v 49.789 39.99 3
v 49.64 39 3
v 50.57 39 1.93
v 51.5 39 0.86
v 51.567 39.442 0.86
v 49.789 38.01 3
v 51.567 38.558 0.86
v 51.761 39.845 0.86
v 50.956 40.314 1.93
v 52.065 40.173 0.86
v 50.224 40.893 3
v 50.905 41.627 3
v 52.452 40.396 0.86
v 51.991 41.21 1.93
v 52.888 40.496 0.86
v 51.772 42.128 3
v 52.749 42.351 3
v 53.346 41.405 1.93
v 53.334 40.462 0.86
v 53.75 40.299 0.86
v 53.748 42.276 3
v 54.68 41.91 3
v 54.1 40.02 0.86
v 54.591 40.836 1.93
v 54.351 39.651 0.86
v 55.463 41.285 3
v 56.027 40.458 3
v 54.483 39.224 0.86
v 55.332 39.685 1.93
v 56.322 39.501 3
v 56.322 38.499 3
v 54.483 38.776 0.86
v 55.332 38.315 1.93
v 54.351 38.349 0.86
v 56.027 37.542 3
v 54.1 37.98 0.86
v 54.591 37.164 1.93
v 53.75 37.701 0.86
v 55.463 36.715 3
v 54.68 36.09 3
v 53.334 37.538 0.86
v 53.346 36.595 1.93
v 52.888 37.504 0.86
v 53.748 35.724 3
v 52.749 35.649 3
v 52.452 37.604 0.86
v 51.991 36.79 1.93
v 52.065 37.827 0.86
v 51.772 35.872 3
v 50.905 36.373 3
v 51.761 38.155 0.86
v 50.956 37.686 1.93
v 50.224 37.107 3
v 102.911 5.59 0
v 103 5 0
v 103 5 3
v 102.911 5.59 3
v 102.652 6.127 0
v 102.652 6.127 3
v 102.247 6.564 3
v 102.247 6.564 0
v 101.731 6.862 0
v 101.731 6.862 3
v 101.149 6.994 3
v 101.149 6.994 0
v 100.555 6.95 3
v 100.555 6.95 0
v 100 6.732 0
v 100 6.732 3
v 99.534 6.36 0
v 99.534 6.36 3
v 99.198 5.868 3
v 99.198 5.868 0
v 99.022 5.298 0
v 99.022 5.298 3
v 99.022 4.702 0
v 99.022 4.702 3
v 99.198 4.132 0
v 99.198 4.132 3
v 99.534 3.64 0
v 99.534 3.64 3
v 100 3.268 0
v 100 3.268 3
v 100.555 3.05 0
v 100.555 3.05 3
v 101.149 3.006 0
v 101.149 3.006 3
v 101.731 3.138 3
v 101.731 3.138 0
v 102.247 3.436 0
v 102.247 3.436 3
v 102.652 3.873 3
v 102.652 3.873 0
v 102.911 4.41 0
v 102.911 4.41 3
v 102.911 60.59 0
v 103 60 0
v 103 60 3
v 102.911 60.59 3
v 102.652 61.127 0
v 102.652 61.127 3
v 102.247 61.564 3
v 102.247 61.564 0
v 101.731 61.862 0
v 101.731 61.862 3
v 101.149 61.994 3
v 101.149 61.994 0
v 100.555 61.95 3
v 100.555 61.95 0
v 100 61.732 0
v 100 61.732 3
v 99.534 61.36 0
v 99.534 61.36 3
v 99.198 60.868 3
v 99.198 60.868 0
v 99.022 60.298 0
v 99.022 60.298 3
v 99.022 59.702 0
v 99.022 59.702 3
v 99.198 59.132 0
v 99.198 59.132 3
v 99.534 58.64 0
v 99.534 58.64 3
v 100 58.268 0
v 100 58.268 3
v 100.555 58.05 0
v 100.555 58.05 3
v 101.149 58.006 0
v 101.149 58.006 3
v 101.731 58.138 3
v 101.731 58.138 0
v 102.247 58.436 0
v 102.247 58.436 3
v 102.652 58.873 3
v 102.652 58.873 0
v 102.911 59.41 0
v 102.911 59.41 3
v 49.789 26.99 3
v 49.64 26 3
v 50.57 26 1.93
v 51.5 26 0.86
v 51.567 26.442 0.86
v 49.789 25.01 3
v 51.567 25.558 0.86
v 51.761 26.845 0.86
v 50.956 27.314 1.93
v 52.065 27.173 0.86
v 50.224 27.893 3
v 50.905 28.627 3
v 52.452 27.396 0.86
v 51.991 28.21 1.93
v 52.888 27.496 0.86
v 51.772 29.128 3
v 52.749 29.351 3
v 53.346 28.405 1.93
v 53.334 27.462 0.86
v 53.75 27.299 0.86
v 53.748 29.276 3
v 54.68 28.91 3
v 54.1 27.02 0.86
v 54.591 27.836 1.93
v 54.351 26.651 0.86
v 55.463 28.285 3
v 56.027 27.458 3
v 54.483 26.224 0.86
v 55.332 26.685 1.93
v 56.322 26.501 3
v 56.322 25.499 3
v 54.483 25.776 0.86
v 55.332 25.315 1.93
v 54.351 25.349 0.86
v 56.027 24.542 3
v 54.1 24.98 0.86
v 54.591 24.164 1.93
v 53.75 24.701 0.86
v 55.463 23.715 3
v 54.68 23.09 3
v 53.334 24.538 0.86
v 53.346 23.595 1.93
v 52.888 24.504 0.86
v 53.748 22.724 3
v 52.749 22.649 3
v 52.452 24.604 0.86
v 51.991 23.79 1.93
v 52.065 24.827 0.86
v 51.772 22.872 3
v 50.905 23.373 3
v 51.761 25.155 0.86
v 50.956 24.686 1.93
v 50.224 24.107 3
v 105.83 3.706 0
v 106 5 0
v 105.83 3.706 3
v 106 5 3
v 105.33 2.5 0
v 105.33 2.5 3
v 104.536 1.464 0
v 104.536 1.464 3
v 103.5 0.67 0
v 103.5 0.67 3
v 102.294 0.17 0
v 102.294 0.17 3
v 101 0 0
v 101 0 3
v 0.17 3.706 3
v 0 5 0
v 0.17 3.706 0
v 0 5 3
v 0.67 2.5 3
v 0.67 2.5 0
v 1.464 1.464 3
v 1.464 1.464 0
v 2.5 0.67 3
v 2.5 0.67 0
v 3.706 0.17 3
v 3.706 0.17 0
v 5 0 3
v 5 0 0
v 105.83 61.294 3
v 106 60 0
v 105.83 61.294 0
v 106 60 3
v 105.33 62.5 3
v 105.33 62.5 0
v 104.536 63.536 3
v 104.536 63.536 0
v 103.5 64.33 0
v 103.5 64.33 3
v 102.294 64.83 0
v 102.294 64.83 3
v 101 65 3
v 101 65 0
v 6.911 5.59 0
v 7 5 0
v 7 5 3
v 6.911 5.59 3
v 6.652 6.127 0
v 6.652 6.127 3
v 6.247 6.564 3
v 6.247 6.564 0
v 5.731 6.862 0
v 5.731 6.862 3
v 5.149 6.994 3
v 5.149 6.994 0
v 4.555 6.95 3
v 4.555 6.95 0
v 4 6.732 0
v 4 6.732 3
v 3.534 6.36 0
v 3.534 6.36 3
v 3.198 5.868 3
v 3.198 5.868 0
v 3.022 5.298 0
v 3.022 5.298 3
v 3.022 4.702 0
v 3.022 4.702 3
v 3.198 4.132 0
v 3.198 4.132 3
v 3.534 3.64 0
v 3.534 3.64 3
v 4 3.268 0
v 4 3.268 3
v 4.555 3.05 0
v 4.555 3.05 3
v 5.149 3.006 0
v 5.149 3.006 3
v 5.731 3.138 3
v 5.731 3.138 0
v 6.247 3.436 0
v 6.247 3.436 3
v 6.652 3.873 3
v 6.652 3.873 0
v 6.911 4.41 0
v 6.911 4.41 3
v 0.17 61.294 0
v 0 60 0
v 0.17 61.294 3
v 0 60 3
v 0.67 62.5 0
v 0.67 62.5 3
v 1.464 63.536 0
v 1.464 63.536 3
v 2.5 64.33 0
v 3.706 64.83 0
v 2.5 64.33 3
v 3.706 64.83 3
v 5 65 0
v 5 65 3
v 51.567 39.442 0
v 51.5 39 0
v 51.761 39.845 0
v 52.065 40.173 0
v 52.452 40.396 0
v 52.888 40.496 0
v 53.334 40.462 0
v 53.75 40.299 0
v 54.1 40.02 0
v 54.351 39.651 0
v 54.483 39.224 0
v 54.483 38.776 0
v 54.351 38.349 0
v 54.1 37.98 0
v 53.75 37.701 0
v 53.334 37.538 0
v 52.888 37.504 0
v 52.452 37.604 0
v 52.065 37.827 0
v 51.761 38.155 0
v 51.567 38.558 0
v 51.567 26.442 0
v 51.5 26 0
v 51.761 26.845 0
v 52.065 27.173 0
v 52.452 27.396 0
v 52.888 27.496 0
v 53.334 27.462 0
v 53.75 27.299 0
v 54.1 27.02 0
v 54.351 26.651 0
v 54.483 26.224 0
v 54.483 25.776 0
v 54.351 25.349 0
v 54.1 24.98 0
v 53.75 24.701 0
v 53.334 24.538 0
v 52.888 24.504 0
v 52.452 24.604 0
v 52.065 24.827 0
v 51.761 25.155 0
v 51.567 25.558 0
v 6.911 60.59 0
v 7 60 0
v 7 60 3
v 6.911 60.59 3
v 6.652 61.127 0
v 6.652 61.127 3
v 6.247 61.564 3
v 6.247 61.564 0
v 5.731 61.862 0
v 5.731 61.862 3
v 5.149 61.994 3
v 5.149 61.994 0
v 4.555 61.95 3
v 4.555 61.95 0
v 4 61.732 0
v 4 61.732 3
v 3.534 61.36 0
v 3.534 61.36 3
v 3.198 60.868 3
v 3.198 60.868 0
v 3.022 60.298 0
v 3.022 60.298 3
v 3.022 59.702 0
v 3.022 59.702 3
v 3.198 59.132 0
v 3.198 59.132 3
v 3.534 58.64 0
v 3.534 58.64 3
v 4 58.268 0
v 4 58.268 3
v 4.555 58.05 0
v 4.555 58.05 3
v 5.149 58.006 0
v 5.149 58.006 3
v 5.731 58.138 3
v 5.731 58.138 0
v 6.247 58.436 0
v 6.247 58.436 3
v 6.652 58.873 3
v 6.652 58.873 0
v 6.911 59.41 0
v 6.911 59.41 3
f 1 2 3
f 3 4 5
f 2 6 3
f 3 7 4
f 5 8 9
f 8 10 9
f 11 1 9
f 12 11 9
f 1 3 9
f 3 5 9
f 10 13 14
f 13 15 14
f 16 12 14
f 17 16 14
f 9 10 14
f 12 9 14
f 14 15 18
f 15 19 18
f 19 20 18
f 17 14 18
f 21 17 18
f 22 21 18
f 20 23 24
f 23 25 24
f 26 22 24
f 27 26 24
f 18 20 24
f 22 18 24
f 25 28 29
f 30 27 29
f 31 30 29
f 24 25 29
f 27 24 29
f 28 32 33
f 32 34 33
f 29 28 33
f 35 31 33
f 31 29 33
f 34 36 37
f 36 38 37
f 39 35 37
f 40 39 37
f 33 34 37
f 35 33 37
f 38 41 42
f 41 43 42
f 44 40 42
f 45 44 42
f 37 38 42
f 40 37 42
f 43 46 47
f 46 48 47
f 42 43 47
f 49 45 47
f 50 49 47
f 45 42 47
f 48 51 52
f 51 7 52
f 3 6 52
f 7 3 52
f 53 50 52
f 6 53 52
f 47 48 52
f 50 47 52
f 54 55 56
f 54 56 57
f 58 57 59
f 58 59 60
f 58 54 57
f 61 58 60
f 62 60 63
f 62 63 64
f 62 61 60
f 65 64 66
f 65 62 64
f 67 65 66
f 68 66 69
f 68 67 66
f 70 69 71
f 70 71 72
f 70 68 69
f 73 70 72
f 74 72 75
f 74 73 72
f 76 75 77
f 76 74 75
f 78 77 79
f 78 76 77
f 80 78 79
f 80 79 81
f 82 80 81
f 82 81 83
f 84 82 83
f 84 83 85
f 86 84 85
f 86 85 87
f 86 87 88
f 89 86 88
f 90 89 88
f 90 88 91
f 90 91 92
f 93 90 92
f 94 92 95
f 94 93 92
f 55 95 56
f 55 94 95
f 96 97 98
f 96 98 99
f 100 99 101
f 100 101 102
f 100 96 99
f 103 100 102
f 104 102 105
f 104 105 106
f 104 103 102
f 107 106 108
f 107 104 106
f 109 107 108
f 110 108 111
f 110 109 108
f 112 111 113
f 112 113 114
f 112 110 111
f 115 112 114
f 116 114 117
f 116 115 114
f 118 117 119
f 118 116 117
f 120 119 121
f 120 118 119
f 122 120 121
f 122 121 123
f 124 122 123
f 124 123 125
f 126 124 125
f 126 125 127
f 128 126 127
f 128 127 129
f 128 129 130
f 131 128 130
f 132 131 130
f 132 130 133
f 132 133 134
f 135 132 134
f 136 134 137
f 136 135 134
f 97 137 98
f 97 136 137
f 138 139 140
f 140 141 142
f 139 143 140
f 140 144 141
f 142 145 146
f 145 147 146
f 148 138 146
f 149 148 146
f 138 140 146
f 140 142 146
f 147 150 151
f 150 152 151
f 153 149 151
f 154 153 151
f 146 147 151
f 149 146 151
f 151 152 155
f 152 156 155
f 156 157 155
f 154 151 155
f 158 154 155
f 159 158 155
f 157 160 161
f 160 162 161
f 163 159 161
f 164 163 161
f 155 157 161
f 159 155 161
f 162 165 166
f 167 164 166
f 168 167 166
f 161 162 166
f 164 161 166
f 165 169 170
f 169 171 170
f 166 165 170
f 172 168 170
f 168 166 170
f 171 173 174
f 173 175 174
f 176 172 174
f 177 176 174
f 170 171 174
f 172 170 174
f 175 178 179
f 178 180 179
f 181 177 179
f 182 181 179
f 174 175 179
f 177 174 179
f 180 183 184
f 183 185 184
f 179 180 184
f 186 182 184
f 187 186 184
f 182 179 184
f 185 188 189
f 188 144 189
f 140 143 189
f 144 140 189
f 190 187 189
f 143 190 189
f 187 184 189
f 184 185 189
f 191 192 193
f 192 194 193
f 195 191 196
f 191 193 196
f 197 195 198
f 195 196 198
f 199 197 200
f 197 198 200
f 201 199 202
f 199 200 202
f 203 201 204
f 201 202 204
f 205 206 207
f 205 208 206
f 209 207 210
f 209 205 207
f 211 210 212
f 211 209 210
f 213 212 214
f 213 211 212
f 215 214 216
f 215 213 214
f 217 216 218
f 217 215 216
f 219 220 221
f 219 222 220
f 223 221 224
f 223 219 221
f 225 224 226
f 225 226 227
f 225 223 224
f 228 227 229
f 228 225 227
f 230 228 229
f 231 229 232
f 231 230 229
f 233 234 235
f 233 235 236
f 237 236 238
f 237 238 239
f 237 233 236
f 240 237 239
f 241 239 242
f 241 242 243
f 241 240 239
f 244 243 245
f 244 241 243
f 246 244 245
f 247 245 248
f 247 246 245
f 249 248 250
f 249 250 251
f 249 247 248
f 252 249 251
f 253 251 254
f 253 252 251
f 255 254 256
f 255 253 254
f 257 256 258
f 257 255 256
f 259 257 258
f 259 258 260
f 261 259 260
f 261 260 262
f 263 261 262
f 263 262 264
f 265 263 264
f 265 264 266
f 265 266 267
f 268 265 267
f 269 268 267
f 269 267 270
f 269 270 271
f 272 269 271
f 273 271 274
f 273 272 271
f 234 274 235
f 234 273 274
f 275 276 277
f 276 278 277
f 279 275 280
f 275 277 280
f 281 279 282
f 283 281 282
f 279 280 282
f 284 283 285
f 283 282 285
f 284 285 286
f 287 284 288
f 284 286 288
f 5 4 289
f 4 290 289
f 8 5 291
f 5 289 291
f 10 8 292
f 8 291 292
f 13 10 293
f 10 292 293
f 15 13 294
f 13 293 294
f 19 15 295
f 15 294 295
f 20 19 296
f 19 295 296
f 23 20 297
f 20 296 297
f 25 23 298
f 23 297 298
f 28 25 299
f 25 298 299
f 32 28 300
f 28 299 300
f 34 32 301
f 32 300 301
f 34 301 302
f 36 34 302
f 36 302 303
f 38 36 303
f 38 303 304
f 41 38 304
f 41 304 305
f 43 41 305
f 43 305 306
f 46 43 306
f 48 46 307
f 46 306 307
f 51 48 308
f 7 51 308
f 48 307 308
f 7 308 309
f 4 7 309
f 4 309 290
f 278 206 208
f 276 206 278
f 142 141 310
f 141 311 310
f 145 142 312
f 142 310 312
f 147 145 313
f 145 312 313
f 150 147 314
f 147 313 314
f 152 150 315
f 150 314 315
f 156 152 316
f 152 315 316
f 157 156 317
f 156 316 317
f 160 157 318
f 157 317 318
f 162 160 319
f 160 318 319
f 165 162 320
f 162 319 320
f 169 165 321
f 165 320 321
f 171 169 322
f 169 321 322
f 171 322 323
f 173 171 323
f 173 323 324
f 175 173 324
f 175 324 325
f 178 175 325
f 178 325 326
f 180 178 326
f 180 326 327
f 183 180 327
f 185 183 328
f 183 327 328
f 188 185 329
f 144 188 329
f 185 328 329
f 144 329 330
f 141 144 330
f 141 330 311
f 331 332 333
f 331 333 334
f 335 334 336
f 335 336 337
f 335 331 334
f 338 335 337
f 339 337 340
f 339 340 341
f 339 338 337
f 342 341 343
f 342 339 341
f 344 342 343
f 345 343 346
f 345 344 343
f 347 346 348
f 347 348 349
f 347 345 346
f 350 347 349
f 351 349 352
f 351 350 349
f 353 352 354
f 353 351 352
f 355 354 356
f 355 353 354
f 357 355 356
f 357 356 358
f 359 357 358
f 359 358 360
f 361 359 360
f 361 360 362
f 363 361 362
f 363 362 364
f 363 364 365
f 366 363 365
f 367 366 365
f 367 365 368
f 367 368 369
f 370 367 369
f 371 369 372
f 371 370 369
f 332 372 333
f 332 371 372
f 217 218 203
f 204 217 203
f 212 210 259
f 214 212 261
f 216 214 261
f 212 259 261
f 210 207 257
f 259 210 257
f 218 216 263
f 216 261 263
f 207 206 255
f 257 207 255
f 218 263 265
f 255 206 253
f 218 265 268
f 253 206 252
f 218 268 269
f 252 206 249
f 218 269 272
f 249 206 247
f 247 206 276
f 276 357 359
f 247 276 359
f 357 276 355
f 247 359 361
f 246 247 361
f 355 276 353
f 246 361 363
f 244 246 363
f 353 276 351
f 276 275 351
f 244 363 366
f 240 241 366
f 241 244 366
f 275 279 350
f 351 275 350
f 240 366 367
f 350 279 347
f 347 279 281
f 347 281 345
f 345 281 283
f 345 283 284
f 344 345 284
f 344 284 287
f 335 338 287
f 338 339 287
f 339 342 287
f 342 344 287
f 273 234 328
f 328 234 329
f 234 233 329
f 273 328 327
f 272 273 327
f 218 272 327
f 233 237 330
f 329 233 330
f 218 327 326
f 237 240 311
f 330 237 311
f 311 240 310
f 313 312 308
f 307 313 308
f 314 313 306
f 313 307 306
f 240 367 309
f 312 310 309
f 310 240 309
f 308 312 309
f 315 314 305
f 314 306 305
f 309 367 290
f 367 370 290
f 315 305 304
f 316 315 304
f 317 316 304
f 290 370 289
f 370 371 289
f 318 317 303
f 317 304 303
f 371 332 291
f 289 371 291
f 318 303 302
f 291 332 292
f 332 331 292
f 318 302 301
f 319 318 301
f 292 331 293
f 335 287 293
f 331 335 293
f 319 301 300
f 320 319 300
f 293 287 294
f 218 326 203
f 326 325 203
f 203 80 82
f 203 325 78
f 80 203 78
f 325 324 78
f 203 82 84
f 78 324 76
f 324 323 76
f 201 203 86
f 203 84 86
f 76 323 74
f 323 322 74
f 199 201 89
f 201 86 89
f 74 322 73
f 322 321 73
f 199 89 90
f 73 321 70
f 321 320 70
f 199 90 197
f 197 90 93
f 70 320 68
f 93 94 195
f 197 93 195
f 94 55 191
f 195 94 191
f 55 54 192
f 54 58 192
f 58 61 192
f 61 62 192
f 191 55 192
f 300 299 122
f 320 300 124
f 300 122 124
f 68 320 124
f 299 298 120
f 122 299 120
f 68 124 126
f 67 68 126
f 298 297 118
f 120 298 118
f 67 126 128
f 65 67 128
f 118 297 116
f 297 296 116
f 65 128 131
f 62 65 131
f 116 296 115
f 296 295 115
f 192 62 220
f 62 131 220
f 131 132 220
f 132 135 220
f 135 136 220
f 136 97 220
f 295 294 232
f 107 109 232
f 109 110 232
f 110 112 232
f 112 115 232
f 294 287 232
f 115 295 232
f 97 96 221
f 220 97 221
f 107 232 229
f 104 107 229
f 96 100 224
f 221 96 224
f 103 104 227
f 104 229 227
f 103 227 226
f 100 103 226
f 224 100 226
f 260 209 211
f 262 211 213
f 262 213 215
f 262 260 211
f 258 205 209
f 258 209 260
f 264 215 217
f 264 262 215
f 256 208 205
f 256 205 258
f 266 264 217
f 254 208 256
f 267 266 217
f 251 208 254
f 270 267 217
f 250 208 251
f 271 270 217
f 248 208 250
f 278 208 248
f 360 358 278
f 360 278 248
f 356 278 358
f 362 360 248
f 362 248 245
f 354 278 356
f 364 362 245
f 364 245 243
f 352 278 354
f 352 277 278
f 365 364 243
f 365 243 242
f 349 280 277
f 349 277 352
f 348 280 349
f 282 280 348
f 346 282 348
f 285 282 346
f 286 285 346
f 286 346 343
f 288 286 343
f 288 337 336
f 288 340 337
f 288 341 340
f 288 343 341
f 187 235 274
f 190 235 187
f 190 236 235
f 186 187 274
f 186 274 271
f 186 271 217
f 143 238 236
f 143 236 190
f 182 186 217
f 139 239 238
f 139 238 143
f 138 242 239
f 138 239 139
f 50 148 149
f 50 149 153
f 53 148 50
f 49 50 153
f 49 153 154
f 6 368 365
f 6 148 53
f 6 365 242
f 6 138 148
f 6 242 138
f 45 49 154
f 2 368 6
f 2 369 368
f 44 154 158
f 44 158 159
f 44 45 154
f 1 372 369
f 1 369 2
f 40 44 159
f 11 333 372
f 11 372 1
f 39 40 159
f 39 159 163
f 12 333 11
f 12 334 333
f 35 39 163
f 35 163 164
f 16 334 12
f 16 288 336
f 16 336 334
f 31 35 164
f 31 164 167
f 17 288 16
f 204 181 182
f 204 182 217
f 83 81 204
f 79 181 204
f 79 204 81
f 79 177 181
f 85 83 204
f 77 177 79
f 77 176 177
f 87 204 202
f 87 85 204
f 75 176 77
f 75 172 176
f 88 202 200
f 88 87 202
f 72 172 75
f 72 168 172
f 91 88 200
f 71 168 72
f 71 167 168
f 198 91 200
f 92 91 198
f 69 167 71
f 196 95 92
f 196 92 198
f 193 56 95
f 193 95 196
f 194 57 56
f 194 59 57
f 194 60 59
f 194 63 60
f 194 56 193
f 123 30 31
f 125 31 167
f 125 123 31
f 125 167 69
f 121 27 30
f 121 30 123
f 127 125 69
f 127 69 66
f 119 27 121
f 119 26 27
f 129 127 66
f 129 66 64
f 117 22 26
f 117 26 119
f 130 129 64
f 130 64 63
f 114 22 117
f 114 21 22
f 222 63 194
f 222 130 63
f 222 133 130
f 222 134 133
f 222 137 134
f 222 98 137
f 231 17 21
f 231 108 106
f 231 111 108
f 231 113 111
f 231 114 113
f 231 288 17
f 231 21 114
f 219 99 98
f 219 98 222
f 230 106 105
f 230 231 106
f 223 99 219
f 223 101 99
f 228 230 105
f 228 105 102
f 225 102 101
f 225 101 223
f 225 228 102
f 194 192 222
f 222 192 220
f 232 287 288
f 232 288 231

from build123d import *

# Parameters (mm, degrees)
F0_W           = 106
F0_H           = 65
F0_R           = 2
F1_DEPTH       = 3
F3_D           = 3
F3_CSINK_D     = 6.72
F3_CSINK_ANGLE = 82
F4_R           = 5


with BuildPart() as f1:
    # F0 (on Top) → F1 (new body)
    with BuildSketch(Plane.XY):
        with Locations((53, 32.5)):
            Rectangle(F0_W, F0_H)
        with Locations((5, 5)):
            Circle(F0_R, mode=Mode.SUBTRACT)
        with Locations((101, 5)):
            Circle(F0_R, mode=Mode.SUBTRACT)
        with Locations((5, 60)):
            Circle(F0_R, mode=Mode.SUBTRACT)
        with Locations((101, 60)):
            Circle(F0_R, mode=Mode.SUBTRACT)
    extrude(amount=F1_DEPTH)

    # F3 (through all)
    with Locations(Plane.XY.offset(3)):
        with Locations((53, 39), (53, 26)):
            CounterSinkHole(F3_D / 2, F3_CSINK_D / 2, counter_sink_angle=F3_CSINK_ANGLE)

    # F4
    f4_edges = [f1.edges().sort_by_distance(p)[0] for p in [
        (106, 0, 1.5),
        (0, 0, 1.5),
        (0, 65, 1.5),
        (106, 65, 1.5),
    ]]
    fillet(f4_edges, radius=F4_R)


solid = f1.part
